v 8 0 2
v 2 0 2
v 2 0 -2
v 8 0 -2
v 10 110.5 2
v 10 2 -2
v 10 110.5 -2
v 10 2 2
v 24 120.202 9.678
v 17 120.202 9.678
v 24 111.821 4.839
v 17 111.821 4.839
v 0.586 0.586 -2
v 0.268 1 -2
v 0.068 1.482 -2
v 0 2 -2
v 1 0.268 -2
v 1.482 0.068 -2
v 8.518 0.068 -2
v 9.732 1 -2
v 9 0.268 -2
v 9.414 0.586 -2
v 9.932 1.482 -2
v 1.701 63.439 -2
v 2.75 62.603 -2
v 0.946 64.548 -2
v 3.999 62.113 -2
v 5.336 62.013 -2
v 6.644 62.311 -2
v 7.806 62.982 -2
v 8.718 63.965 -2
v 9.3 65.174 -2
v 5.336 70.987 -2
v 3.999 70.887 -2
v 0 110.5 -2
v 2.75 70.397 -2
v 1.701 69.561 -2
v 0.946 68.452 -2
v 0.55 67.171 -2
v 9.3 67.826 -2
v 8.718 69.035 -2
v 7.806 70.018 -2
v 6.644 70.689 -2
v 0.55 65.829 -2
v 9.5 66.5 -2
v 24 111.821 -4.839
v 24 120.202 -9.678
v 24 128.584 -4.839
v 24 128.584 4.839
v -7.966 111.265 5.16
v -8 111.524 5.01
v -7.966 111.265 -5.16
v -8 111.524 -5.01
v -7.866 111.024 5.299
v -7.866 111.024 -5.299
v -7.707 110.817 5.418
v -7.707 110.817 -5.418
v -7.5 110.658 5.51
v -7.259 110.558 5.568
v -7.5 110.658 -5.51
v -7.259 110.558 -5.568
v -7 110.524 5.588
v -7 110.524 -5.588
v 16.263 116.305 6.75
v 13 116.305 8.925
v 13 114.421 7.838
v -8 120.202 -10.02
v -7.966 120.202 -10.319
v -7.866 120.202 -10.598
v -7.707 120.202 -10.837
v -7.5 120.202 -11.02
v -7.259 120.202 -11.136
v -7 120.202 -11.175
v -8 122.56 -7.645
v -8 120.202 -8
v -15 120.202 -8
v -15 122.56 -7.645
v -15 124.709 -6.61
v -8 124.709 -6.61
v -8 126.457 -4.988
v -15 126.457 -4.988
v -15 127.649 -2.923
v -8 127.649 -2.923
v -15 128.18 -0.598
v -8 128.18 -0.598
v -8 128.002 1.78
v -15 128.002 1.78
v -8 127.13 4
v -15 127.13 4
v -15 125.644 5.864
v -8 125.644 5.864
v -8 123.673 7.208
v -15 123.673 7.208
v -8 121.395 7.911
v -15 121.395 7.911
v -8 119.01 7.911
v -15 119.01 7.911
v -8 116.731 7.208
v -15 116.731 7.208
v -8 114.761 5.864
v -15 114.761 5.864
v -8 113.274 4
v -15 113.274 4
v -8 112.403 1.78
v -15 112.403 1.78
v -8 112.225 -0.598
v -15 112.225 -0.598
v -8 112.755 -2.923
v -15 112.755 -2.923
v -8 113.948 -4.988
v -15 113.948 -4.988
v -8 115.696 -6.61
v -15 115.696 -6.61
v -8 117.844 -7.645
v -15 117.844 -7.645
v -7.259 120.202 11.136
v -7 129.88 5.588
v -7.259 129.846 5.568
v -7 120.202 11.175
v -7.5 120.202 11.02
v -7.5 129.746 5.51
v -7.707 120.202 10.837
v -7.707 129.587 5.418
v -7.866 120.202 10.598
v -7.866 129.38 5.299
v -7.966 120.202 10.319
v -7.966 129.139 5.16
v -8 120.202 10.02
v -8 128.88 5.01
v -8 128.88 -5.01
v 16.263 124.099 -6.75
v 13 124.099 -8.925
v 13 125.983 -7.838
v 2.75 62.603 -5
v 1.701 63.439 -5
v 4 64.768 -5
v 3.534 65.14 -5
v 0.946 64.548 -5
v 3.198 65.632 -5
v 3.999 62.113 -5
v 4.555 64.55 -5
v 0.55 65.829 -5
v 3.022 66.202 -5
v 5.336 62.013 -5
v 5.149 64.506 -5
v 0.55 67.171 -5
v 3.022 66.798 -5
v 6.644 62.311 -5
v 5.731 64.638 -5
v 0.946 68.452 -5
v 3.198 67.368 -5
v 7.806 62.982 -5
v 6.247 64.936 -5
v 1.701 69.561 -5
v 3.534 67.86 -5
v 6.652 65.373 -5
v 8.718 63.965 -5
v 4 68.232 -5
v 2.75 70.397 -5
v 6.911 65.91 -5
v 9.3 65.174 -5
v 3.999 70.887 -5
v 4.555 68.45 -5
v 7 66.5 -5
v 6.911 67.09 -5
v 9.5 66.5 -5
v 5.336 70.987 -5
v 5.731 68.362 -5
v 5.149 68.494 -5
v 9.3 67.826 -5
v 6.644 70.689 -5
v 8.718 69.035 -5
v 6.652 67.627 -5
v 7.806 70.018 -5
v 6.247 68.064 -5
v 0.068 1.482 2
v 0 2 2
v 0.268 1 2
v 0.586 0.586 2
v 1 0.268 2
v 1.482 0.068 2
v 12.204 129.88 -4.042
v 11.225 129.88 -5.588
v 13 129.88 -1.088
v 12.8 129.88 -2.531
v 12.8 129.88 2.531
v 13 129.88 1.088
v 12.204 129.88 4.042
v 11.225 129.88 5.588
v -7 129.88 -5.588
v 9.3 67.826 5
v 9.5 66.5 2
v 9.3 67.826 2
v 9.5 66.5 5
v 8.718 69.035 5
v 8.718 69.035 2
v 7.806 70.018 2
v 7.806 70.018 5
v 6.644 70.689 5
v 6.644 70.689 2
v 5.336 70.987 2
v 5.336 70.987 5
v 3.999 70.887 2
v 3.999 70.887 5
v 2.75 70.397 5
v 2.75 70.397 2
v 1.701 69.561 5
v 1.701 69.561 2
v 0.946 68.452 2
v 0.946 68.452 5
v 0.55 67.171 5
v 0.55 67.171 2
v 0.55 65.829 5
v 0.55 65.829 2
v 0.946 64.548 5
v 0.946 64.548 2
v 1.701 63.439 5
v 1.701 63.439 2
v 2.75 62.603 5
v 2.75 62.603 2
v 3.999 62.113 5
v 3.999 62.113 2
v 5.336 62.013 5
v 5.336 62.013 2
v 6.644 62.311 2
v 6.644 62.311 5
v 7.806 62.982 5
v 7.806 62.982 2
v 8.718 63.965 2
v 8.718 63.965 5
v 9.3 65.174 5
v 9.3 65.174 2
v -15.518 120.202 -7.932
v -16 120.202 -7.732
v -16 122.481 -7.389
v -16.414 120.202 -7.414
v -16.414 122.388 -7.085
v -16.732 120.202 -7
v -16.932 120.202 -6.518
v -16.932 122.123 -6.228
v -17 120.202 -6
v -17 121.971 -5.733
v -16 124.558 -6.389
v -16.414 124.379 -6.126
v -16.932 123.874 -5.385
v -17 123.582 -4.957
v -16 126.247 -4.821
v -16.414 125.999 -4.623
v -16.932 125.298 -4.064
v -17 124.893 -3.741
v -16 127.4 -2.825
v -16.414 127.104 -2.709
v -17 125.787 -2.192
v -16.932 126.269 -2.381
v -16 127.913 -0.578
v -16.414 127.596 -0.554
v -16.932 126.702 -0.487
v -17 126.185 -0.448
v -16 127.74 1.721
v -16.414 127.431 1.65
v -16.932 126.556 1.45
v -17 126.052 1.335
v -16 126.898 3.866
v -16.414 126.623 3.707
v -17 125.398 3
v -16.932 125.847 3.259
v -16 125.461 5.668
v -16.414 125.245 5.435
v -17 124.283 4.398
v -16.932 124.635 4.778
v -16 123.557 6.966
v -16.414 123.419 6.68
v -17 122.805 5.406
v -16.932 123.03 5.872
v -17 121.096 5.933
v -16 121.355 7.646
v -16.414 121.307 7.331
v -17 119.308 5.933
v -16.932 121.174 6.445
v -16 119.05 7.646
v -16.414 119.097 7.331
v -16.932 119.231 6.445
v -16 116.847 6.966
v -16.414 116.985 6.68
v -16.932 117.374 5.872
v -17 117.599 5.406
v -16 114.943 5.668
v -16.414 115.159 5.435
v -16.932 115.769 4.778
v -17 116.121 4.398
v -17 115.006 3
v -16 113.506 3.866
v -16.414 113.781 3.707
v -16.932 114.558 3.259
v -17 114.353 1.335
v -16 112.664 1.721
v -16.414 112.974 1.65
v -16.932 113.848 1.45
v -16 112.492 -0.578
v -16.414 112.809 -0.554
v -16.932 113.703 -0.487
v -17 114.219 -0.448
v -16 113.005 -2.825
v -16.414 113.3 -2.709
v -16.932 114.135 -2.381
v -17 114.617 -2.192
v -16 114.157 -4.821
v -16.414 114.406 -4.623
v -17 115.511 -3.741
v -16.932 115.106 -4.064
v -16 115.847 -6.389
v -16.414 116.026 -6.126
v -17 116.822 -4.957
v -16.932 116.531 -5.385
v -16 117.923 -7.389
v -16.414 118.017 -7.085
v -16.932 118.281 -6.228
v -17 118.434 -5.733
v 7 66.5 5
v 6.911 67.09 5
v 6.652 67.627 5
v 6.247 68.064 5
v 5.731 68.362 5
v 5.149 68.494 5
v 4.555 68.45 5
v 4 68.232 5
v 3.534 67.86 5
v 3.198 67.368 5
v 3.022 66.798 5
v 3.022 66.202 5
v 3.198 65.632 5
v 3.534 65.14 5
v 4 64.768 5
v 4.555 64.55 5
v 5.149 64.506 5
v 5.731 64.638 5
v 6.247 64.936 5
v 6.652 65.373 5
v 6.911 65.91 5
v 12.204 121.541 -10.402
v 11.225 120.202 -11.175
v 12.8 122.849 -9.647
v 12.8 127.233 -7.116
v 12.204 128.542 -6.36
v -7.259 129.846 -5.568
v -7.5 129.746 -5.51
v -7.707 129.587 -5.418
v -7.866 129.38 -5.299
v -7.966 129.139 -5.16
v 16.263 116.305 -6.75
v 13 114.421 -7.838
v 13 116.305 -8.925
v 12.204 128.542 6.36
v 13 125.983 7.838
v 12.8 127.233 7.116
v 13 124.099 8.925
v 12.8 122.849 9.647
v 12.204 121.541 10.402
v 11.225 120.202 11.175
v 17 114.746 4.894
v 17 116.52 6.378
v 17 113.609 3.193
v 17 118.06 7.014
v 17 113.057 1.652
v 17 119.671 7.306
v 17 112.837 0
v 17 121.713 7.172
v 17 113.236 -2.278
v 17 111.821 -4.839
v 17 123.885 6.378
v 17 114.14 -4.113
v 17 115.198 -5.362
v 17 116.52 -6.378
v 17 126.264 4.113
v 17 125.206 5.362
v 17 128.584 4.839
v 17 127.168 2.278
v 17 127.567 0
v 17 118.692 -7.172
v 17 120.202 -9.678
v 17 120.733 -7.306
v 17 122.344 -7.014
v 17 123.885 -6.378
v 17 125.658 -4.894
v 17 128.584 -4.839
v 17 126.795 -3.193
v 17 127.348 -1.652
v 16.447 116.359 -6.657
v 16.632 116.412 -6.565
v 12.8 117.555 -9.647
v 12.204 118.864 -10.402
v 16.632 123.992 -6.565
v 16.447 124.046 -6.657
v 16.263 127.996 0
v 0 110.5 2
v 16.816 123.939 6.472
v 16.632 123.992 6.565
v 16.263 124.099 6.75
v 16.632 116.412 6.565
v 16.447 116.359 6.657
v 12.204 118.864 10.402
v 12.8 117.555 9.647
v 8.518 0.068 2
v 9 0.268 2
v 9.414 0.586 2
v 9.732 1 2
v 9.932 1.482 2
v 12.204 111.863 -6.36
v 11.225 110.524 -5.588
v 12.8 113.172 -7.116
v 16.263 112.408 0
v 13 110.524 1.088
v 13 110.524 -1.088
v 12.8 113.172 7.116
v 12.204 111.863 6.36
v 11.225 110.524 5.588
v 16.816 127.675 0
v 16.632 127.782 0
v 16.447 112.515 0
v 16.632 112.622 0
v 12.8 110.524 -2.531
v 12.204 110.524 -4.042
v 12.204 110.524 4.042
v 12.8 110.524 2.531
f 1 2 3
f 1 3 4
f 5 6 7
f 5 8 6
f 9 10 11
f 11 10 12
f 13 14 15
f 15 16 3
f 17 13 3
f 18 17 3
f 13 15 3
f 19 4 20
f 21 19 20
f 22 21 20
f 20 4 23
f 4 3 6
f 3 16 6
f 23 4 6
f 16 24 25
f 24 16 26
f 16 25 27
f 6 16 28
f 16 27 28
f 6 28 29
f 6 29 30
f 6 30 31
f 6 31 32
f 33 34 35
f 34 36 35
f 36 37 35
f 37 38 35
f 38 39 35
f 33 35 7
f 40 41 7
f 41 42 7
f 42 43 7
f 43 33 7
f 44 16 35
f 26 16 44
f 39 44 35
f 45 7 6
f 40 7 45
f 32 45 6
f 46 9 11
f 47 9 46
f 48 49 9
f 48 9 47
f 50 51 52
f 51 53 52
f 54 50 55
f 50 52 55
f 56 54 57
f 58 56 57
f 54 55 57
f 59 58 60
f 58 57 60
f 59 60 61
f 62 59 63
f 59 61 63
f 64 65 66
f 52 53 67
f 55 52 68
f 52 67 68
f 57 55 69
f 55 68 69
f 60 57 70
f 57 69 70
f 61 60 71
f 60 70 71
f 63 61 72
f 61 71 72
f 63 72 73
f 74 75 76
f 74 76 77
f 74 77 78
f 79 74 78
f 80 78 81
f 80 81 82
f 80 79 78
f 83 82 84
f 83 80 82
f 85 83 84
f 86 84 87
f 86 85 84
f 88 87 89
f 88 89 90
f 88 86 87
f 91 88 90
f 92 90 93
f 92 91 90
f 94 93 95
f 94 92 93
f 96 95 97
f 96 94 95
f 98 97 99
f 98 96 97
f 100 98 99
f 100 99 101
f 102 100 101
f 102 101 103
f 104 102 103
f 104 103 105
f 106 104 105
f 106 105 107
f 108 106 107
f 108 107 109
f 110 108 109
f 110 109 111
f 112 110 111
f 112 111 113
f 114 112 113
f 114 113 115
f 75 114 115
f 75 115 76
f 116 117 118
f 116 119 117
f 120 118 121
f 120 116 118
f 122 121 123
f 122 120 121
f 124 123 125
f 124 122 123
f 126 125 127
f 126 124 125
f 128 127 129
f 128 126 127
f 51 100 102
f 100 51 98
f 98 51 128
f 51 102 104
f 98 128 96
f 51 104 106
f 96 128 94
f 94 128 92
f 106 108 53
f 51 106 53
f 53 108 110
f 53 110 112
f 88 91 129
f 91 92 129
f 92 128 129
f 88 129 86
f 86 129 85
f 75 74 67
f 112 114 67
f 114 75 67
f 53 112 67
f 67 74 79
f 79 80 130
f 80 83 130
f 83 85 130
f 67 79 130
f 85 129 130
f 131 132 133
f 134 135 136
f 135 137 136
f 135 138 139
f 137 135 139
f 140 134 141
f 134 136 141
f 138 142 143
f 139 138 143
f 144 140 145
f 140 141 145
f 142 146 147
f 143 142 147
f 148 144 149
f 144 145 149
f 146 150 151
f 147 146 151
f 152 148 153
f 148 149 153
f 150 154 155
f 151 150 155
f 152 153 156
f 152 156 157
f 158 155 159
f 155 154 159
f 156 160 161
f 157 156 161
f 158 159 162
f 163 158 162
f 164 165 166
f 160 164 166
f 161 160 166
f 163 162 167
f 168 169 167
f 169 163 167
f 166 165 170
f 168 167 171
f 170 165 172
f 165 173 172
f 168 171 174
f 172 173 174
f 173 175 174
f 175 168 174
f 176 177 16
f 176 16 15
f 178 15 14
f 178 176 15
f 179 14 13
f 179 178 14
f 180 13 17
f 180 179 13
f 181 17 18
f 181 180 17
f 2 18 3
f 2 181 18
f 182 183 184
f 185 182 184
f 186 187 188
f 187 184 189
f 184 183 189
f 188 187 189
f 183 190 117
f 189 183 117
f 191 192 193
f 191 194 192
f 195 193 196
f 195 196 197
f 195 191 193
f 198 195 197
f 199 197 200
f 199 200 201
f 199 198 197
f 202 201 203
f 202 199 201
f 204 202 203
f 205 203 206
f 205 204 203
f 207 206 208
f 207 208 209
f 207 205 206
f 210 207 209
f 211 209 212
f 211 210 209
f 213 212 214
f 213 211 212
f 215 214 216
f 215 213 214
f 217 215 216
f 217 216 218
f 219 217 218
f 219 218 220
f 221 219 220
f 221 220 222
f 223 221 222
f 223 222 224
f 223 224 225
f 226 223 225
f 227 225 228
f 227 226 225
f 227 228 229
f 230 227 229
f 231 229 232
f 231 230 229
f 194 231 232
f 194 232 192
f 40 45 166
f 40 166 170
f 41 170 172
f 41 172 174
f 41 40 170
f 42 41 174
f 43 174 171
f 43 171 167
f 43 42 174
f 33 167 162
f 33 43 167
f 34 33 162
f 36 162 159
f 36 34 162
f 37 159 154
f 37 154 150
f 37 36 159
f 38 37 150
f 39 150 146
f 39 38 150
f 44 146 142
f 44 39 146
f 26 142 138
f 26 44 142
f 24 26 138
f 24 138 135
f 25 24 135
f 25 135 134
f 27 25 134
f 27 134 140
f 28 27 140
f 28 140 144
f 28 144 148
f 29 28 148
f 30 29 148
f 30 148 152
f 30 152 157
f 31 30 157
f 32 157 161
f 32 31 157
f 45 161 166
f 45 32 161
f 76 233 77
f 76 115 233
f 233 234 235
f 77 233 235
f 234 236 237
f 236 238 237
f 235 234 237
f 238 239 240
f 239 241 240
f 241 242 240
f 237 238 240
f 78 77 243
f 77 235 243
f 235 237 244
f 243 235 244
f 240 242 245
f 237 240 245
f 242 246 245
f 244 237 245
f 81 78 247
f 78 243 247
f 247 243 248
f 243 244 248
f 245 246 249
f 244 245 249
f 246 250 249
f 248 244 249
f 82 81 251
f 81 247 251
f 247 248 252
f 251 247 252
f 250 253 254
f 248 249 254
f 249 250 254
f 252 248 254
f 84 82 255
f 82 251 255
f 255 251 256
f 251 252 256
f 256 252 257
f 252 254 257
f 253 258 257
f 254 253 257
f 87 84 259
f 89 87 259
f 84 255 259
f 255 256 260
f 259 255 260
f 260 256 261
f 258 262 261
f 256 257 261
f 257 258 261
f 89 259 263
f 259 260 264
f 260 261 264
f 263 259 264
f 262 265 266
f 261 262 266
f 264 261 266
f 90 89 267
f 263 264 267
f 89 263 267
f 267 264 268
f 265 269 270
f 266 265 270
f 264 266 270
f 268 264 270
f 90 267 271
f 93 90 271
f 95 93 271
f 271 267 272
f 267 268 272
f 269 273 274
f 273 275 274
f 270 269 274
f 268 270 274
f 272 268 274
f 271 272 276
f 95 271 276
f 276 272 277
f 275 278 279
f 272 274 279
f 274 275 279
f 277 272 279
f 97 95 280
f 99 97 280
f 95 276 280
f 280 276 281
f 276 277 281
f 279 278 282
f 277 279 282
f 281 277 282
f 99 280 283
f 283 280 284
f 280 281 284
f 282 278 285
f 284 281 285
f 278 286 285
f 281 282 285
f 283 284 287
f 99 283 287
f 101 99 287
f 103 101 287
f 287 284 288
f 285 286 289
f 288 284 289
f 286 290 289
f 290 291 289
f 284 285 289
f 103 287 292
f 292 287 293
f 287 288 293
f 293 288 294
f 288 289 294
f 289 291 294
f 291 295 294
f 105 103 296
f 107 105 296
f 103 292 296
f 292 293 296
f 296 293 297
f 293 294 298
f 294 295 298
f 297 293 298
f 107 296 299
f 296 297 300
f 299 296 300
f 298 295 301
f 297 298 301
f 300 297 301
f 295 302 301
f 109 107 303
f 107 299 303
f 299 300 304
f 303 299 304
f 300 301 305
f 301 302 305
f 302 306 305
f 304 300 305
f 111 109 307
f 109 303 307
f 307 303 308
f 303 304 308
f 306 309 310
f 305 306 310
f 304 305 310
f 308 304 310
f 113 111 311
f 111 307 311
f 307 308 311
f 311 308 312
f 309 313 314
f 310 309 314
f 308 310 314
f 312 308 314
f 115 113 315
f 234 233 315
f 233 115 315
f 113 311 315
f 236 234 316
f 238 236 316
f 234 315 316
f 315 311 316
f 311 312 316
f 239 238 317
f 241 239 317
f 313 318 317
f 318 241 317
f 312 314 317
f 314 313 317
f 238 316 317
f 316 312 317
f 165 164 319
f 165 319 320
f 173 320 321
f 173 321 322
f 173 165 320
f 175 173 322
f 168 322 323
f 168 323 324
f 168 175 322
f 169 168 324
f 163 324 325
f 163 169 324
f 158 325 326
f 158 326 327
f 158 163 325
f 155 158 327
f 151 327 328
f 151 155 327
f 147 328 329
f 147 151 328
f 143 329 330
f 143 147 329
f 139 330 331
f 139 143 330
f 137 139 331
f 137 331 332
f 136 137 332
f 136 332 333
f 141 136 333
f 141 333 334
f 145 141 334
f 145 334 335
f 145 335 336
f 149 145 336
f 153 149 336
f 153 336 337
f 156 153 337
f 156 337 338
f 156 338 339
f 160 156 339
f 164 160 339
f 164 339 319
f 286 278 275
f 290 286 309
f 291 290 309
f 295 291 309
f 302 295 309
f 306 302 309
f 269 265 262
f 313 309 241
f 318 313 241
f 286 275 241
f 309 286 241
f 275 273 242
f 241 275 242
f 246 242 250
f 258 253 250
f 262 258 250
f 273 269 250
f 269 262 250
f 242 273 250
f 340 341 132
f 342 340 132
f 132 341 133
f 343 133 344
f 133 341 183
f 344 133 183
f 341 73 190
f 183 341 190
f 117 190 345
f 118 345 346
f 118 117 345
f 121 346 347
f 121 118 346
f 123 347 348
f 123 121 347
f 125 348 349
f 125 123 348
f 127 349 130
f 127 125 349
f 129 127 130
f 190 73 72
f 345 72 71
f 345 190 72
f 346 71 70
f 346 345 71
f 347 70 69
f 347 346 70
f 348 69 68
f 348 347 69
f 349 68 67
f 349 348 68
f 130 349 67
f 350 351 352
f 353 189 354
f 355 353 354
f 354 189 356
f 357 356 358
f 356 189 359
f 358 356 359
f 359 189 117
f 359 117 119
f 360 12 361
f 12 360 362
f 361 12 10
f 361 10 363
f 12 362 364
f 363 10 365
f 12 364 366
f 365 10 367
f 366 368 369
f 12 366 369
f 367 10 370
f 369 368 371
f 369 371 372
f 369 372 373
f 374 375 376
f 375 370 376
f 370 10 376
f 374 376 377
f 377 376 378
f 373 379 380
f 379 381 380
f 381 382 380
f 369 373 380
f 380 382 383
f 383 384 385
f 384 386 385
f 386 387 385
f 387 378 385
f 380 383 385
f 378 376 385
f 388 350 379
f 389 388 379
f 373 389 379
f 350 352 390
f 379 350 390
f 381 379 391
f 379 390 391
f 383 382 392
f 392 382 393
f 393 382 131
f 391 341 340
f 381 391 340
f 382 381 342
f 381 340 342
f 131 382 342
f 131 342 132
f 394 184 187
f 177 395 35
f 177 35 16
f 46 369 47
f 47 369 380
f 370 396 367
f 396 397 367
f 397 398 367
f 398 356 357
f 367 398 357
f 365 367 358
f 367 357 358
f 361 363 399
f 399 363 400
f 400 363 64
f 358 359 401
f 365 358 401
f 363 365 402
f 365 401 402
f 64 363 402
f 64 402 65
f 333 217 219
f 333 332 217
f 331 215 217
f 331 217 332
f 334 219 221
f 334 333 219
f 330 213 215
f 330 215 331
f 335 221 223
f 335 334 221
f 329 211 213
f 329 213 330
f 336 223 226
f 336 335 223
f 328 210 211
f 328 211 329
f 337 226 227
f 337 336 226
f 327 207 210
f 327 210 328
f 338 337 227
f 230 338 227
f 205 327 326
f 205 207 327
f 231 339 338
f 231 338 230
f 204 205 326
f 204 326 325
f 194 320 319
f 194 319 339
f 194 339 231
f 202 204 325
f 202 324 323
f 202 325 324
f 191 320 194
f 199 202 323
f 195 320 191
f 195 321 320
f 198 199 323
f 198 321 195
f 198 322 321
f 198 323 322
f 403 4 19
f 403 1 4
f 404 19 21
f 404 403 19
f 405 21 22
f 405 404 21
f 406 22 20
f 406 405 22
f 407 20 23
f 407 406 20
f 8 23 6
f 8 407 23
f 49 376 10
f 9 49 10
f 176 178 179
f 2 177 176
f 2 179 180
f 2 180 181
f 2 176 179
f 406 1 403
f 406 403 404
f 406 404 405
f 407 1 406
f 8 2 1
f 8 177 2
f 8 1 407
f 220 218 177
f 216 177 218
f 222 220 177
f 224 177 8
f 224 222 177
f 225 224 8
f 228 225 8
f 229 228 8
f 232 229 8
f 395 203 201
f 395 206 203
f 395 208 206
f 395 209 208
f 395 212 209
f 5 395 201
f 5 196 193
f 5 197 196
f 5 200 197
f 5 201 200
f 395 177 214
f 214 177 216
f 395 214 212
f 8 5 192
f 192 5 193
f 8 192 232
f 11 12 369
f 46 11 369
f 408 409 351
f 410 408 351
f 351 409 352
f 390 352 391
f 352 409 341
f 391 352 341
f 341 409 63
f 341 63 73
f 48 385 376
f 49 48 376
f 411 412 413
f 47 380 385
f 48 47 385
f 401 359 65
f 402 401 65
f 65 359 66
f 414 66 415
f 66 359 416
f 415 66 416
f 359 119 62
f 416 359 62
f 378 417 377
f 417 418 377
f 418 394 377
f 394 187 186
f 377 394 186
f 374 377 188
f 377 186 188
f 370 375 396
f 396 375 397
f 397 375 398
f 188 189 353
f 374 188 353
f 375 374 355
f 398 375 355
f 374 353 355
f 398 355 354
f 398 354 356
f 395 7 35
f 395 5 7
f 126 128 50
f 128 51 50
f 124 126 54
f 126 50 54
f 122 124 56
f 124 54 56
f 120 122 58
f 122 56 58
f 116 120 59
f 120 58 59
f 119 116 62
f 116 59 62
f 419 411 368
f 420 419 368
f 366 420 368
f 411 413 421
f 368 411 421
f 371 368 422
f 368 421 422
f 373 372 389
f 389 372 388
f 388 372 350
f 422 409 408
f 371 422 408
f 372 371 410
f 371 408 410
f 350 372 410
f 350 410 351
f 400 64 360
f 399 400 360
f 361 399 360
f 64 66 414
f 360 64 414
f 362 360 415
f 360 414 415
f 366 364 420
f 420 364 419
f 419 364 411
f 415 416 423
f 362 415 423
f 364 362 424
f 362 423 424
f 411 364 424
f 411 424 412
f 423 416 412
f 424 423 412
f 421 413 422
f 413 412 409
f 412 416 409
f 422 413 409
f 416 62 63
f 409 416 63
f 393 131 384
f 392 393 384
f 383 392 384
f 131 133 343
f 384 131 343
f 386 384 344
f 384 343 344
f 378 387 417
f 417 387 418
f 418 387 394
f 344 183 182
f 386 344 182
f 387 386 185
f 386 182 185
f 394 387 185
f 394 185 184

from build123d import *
from OCP.BRepFilletAPI import BRepFilletAPI_MakeChamfer

# Parameters (mm, degrees)
SKETCH1_R                = 4.5
SKETCH1_R_2              = 2
BOSS_EXTRUDE1_DEPTH      = 2
SKETCH1_3_R              = 4.5
SKETCH1_3_R_2            = 2
BOSS_EXTRUDE2_DEPTH      = 5
SKETCH2_R                = 8
BOSS_EXTRUDE3_DEPTH      = 17
BOSS_EXTRUDE5_DEPTH      = 20
BOSS_EXTRUDE5_DEPTH_BACK = 8
SKETCH2_4_R              = 8
FILLET3_R                = 1
FILLET4_R                = 2
CHAMFER1_SIZE            = 7
CHAMFER1_SIZE2           = 4.041451884
FILLET5_R                = 9
BOSS_EXTRUDE6_DEPTH      = 4
BOSS_EXTRUDE6_DEPTH_BACK = 3
BOSS_EXTRUDE6_START      = 20
SKETCH2_7_R              = 8


with BuildPart() as part:
    # Sketch1 → Boss-Extrude1 (new, symmetric)
    # profile 1 of 2: a face of its own
    with BuildSketch(Plane.XY):
        with BuildLine():
            Line((10, 110.5), (0, 110.5))
            Line((0, 110.5), (0, 2))
            ThreePointArc((0, 2), (0.585786438, 0.585786438), (2, 0))
            Line((2, 0), (8, 0))
            ThreePointArc((8, 0), (9.414213562, 0.585786438), (10, 2))
            Line((10, 2), (10, 110.5))
        make_face()
        with Locations((5, 66.5)):
            Circle(SKETCH1_R, mode=Mode.SUBTRACT)
    # profile 2 of 2: a face of its own
    with BuildSketch(Plane.XY):
        with Locations((5, 66.5)):
            Circle(SKETCH1_R)
        with Locations((5, 66.5)):
            Circle(SKETCH1_R_2, mode=Mode.SUBTRACT)
    extrude(amount=BOSS_EXTRUDE1_DEPTH, both=True)

    # Sketch1<3> → Boss-Extrude2 (add, symmetric)
    with BuildSketch(Plane.XY):
        with Locations((5, 66.5)):
            Circle(SKETCH1_3_R)
        with Locations((5, 66.5)):
            Circle(SKETCH1_3_R_2, mode=Mode.SUBTRACT)
    extrude(amount=BOSS_EXTRUDE2_DEPTH, both=True)


with BuildPart() as body_2:
    # Sketch2 → Boss-Extrude3 (new body)
    with BuildSketch(Plane(origin=(0, 0, 0), x_dir=(0, 0, -1), z_dir=(1, 0, 0))):
        with Locations((0, 120.20217709)):
            Circle(SKETCH2_R)
    extrude(amount=-BOSS_EXTRUDE3_DEPTH)

    # Sketch2<4> → Boss-Extrude5 (add, two sides: drawn at the far end of the back side and taken through both)
    # profile 1 of 3: a face of its own
    with BuildSketch(Plane(origin=(0, 0, 0), x_dir=(0, 0, -1), z_dir=(1, 0, 0)).offset(-BOSS_EXTRUDE5_DEPTH_BACK)):
        Polygon((5.587548937, 129.880095739), (-5.587548937, 129.880095739), (-11.175097875, 120.20217709), (-5.587548937, 110.524258441), (5.587548937, 110.524258441), (11.175097875, 120.20217709), align=None)
        with Locations((0, 120.20217709)):
            Circle(SKETCH2_4_R, mode=Mode.SUBTRACT)
    # profile 2 of 3: a face of its own
    with BuildSketch(Plane(origin=(0, 0, 0), x_dir=(0, 0, -1), z_dir=(1, 0, 0)).offset(-BOSS_EXTRUDE5_DEPTH_BACK)):
        Polygon((-4.838959325, 111.820853684), (4.838959325, 111.820853684), (9.677918649, 120.20217709), (4.838959325, 128.583500496), (-4.838959325, 128.583500496), (-9.677918649, 120.20217709), align=None)
        with Locations((0, 120.20217709)):
            Circle(SKETCH2_4_R, mode=Mode.SUBTRACT)
    # profile 3 of 3: a face of its own
    with BuildSketch(Plane(origin=(0, 0, 0), x_dir=(0, 0, -1), z_dir=(1, 0, 0)).offset(-BOSS_EXTRUDE5_DEPTH_BACK)):
        with Locations((0, 120.20217709)):
            Circle(SKETCH2_4_R)
    extrude(amount=BOSS_EXTRUDE5_DEPTH + BOSS_EXTRUDE5_DEPTH_BACK)

    # Fillet3
    fillet3_edges = [body_2.edges().sort_by_distance(p)[0] for p in [
        (-8, 129.880095739, 0),
        (-8, 125.041136415, -8.381323406),
        (-8, 115.363217765, -8.381323406),
        (-8, 110.524258441, 0),
        (-8, 115.363217765, 8.381323406),
        (-8, 125.041136415, 8.381323406),
    ]]
    fillet(fillet3_edges, radius=FILLET3_R)

    # Fillet4
    fillet4_edges = [body_2.edges().sort_by_distance(p)[0] for p in [
        (-17, 120.20217709, 8),
    ]]
    fillet(fillet4_edges, radius=FILLET4_R)

    # Chamfer1: one chamfer whose edges measure the first distance from different faces: ONE call of the kernel's chamfer builder (chamfer() names one face for all edges)
    chamfer1_edges_1 = [body_2.edges().sort_by_distance(p)[0] for p in [
        (20, 110.524258441, 0),
    ]]
    chamfer1_side_1 = [body_2.faces().sort_by_distance(p)[0] for p in [
        (6.5, 110.524258441, 0),
    ]]
    chamfer1_edges_2 = [body_2.edges().sort_by_distance(p)[0] for p in [
        (20, 115.363217765, -8.381323406),
    ]]
    chamfer1_side_2 = [body_2.faces().sort_by_distance(p)[0] for p in [
        (6.5, 115.363217765, -8.381323406),
    ]]
    chamfer1_edges_3 = [body_2.edges().sort_by_distance(p)[0] for p in [
        (20, 125.041136415, -8.381323406),
    ]]
    chamfer1_side_3 = [body_2.faces().sort_by_distance(p)[0] for p in [
        (6.5, 125.041136415, -8.381323406),
    ]]
    chamfer1_edges_4 = [body_2.edges().sort_by_distance(p)[0] for p in [
        (20, 129.880095739, 0),
    ]]
    chamfer1_side_4 = [body_2.faces().sort_by_distance(p)[0] for p in [
        (6.5, 129.880095739, 0),
    ]]
    chamfer1_edges_5 = [body_2.edges().sort_by_distance(p)[0] for p in [
        (20, 125.041136415, 8.381323406),
    ]]
    chamfer1_side_5 = [body_2.faces().sort_by_distance(p)[0] for p in [
        (6.5, 125.041136415, 8.381323406),
    ]]
    chamfer1_edges_6 = [body_2.edges().sort_by_distance(p)[0] for p in [
        (20, 115.363217765, 8.381323406),
    ]]
    chamfer1_side_6 = [body_2.faces().sort_by_distance(p)[0] for p in [
        (6.5, 115.363217765, 8.381323406),
    ]]
    chamfer1 = BRepFilletAPI_MakeChamfer(body_2.part.solid().wrapped)
    for e in chamfer1_edges_1:
        chamfer1.Add(CHAMFER1_SIZE, CHAMFER1_SIZE2, e.wrapped, chamfer1_side_1[0].wrapped)  # the first distance lies on this face
    for e in chamfer1_edges_2:
        chamfer1.Add(CHAMFER1_SIZE, CHAMFER1_SIZE2, e.wrapped, chamfer1_side_2[0].wrapped)  # the first distance lies on this face
    for e in chamfer1_edges_3:
        chamfer1.Add(CHAMFER1_SIZE, CHAMFER1_SIZE2, e.wrapped, chamfer1_side_3[0].wrapped)  # the first distance lies on this face
    for e in chamfer1_edges_4:
        chamfer1.Add(CHAMFER1_SIZE, CHAMFER1_SIZE2, e.wrapped, chamfer1_side_4[0].wrapped)  # the first distance lies on this face
    for e in chamfer1_edges_5:
        chamfer1.Add(CHAMFER1_SIZE, CHAMFER1_SIZE2, e.wrapped, chamfer1_side_5[0].wrapped)  # the first distance lies on this face
    for e in chamfer1_edges_6:
        chamfer1.Add(CHAMFER1_SIZE, CHAMFER1_SIZE2, e.wrapped, chamfer1_side_6[0].wrapped)  # the first distance lies on this face
    add(Compound.cast(chamfer1.Shape()), mode=Mode.REPLACE)

    # Fillet5
    # the kernel refuses this fillet: 9 mm, written as the material it takes off along each edge
    with BuildSketch(Plane(origin=(4.006659268, 120.20217709, 17.170658362), x_dir=(-0.2401922307076287, 0.9013878188660001, -0.36028834606144067), z_dir=(0.8320502943378434, 1.2088901500668617e-15, -0.5547001962252296)), Plane(origin=(4.006659268, 135.072403432, 8.585329181), x_dir=(-0.24019223070763052, 0.13867504905631706, -0.9607689228305214), z_dir=(0.8320502943378435, -0.48038446141525903, -0.27735009811261924))) as fillet5_piece_1:
        with BuildLine():
            CenterArc((FILLET5_R * 0.480384461415, -FILLET5_R), FILLET5_R, 90, 51.317812547)
            Line((-FILLET5_R * 0.300240288385, -FILLET5_R * 0.375), (0, 0))
            Line((0, 0), (FILLET5_R * 0.480384461415, 0))
        make_face()
    extrude(amount=30.03025374, mode=Mode.SUBTRACT)
    with BuildSketch(Plane(origin=(4.006659268, 105.331950748, 8.585329181), x_dir=(-0.24019223070763074, -0.13867504905630562, -0.9607689228305231), z_dir=(0.832050294337843, 0.48038446141526303, -0.27735009811261374)), Plane(origin=(4.006659268, 105.331950748, -8.585329181), x_dir=(-0.24019223070763016, 0.7627127698096926, -0.6004805767690735), z_dir=(0.8320502943378429, 0.4803844614152607, 0.2773500981126182)), Plane(origin=(4.006659268, 120.20217709, -17.170658362), x_dir=(-0.24019223070763193, 0.9013878188659946, 0.36028834606145216), z_dir=(0.8320502943378428, -3.413336894306415e-15, 0.5547001962252306)), Plane(origin=(4.006659268, 135.072403432, -8.585329181), x_dir=(-0.2401922307076317, 0.13867504905629685, 0.960768922830524), z_dir=(0.832050294337843, -0.48038446141526503, 0.27735009811261024))) as fillet5_piece_2:
        with BuildLine():
            CenterArc((FILLET5_R * 0.480384461415, FILLET5_R), FILLET5_R, 218.682187453, 51.317812547)
            Line((-FILLET5_R * 0.300240288385, FILLET5_R * 0.375), (0, 0))
            Line((0, 0), (FILLET5_R * 0.480384461415, 0))
        make_face()
    extrude(amount=30.03025374, mode=Mode.SUBTRACT)

    # Sketch2<7> → Boss-Extrude6 (add, two sides: drawn at the far end of the back side and taken through both)
    # profile 1 of 2: a face of its own
    with BuildSketch(Plane(origin=(0, 0, 0), x_dir=(0, 0, -1), z_dir=(1, 0, 0)).offset(BOSS_EXTRUDE6_START - BOSS_EXTRUDE6_DEPTH_BACK)):
        Polygon((-4.838959325, 111.820853684), (4.838959325, 111.820853684), (9.677918649, 120.20217709), (4.838959325, 128.583500496), (-4.838959325, 128.583500496), (-9.677918649, 120.20217709), align=None)
        with Locations((0, 120.20217709)):
            Circle(SKETCH2_7_R, mode=Mode.SUBTRACT)
    # profile 2 of 2: a face of its own
    with BuildSketch(Plane(origin=(0, 0, 0), x_dir=(0, 0, -1), z_dir=(1, 0, 0)).offset(BOSS_EXTRUDE6_START - BOSS_EXTRUDE6_DEPTH_BACK)):
        with Locations((0, 120.20217709)):
            Circle(SKETCH2_7_R)
    extrude(amount=BOSS_EXTRUDE6_DEPTH + BOSS_EXTRUDE6_DEPTH_BACK)


solid = Compound([part.part, body_2.part])
